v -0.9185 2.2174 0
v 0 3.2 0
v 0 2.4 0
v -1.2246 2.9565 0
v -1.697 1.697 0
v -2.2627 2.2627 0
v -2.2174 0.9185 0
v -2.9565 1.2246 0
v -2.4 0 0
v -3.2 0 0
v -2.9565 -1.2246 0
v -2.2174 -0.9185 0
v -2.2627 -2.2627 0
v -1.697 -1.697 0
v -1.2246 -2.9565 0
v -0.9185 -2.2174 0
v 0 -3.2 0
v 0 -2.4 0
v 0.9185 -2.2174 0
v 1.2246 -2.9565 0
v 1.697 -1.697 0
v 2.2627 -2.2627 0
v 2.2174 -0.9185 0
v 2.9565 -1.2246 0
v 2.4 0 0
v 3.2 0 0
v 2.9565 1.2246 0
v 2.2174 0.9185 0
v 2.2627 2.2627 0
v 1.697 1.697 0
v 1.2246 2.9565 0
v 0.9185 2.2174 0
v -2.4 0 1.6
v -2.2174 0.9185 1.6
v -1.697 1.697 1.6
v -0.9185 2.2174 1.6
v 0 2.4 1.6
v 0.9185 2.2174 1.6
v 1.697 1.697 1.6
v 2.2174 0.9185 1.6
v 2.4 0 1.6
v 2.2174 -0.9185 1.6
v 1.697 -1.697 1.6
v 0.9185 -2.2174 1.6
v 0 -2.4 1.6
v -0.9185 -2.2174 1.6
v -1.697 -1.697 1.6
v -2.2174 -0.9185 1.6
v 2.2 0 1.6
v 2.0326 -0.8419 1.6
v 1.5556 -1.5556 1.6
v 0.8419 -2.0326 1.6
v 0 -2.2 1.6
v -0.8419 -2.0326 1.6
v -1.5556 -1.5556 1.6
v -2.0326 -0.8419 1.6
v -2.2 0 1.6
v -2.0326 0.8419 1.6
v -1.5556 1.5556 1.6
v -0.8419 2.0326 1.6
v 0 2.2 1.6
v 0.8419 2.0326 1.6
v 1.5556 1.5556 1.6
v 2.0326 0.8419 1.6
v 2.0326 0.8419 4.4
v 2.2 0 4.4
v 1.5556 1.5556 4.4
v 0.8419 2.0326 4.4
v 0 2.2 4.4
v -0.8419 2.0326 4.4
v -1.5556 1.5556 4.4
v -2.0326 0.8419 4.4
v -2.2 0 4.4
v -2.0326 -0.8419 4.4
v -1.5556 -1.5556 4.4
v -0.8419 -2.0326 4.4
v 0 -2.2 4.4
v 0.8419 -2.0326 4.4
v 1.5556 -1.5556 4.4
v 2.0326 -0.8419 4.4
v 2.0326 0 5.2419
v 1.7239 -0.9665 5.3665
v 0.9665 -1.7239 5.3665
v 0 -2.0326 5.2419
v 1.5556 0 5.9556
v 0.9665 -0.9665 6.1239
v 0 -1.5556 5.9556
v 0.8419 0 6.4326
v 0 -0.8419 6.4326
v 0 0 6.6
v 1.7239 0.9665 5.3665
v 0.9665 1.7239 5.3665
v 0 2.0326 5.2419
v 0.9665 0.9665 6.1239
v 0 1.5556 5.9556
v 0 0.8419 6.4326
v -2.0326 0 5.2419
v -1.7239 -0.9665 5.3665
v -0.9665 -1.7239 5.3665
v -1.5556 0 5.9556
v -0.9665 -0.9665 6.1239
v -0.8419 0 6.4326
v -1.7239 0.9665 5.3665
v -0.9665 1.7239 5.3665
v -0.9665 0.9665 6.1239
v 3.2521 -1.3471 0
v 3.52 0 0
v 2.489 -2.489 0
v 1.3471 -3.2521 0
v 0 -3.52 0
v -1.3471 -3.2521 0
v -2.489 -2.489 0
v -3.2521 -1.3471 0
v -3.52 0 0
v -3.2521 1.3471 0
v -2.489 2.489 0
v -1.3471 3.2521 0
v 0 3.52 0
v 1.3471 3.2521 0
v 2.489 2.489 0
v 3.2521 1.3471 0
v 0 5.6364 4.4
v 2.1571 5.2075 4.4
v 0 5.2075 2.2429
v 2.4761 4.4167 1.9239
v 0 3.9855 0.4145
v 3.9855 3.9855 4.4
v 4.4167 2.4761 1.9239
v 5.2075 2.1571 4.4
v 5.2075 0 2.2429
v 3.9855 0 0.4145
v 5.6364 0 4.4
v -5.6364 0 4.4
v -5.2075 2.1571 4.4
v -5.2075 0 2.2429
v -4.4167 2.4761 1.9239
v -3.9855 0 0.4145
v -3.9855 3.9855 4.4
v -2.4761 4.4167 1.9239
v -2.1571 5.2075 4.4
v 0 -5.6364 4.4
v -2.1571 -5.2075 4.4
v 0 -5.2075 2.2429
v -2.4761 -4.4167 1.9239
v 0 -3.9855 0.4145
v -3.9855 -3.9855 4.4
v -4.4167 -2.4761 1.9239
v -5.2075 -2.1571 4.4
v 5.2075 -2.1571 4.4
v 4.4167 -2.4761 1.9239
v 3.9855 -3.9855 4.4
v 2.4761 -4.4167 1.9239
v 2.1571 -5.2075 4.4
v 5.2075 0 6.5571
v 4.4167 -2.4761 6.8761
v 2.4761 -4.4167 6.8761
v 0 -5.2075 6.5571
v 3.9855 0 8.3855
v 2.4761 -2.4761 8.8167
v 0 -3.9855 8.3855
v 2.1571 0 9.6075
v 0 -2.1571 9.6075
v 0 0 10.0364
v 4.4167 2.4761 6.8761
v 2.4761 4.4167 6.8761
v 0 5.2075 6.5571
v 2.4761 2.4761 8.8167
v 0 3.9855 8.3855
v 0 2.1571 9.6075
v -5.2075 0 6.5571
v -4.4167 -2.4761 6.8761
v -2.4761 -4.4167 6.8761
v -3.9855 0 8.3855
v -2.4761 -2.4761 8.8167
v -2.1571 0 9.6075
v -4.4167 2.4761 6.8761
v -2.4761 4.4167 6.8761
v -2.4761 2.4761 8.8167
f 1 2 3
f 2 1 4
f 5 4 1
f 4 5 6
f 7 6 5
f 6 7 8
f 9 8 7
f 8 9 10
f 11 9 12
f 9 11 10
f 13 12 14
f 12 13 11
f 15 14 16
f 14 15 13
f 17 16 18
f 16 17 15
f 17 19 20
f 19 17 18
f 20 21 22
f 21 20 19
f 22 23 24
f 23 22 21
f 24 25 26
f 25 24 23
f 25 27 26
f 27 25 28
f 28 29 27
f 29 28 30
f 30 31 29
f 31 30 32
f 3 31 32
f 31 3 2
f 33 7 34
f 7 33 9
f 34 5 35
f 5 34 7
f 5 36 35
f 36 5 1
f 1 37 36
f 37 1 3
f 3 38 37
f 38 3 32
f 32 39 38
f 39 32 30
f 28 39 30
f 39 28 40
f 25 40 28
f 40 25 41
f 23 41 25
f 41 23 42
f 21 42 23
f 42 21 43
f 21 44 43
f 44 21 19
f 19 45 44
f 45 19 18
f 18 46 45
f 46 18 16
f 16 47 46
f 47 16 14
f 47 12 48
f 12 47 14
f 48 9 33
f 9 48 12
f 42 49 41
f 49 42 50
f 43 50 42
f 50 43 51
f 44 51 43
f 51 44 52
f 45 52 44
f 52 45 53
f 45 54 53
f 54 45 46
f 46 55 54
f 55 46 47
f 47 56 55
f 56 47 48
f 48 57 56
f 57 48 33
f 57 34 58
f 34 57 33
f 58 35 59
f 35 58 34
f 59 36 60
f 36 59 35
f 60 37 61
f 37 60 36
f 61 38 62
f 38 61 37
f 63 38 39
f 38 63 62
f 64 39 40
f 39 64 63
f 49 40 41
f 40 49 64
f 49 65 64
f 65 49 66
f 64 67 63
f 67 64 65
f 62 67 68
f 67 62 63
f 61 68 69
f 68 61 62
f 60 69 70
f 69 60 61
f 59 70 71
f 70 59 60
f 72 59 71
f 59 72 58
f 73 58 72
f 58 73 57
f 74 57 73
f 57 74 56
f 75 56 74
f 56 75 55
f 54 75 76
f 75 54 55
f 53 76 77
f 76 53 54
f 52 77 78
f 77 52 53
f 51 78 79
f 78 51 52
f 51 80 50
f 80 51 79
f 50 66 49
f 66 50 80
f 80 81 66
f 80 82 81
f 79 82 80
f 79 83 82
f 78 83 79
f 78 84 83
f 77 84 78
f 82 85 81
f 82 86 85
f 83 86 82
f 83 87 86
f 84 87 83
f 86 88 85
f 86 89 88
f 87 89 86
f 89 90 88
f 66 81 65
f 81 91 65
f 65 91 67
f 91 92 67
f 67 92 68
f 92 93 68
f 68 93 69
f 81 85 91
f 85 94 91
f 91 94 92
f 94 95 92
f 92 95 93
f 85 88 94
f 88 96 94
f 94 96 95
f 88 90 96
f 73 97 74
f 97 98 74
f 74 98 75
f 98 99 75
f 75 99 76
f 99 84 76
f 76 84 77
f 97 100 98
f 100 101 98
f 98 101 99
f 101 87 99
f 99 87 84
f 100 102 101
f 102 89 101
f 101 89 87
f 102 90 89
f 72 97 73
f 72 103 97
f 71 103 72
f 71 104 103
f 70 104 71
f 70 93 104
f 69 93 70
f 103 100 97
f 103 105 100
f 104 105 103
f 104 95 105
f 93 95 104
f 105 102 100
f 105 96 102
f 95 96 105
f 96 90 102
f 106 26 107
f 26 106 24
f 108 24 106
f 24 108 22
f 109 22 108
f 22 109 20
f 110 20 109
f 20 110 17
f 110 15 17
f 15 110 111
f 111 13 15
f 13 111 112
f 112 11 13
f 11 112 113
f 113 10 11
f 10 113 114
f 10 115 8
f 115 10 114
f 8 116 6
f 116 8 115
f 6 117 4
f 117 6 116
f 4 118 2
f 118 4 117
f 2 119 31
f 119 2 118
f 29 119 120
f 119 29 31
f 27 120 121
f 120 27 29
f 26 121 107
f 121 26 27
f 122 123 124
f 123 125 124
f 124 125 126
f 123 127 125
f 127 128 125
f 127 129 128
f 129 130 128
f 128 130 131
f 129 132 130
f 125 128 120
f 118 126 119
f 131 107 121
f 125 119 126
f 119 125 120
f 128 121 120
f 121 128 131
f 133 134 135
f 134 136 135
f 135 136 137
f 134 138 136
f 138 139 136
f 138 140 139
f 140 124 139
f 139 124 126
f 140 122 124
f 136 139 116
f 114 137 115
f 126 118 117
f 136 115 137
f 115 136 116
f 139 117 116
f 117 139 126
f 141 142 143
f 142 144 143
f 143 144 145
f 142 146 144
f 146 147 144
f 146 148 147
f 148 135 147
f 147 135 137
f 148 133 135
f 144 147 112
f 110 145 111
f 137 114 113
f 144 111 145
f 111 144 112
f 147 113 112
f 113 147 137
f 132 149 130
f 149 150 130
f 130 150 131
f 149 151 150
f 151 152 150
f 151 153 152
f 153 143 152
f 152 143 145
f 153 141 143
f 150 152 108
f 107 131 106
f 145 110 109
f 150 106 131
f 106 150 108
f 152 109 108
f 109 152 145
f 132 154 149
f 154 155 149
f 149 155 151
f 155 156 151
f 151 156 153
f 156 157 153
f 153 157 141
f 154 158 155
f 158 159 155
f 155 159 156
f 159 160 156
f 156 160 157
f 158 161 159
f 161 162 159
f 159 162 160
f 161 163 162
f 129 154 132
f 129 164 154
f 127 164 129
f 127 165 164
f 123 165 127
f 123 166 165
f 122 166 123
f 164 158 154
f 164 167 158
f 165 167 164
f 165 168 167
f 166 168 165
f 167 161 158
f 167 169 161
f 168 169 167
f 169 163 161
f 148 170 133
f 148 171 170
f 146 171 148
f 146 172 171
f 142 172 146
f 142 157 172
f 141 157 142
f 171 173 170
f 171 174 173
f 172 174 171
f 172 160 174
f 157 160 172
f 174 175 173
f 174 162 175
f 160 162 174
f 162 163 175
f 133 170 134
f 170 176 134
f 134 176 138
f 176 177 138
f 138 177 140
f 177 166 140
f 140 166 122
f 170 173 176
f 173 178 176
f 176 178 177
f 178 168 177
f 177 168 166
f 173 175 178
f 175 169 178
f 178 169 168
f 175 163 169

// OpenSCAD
// file: ../p/4-4ring3.scad
use <../lib.scad>
function ldraw_lib__4_4ring3() = [
// 0 Ring  3 x 1.0
// 0 Name: 4-4ring3.dat
// 0 Author: James Jessiman
// 0 !LDRAW_ORG Primitive UPDATE 2009-01
// 0 !LICENSE Licensed under CC BY 2.0 and CC BY 4.0 : see CAreadme.txt
// 
// 0 BFC CERTIFY CCW
  [0,"BFC","CERTIFY"],
  [0,"BFC","CCW"],
// 
// 0 !HISTORY 1998-12-15 [PTadmin] Official Update 1998-10
// 0 !HISTORY 2002-04-05 [hafhead] Added BFC statement
// 0 !HISTORY 2002-04-25 [PTadmin] Official Update 2002-02
// 0 !HISTORY 2007-06-24 [PTadmin] Header formatted for Contributor Agreement
// 0 !HISTORY 2008-07-01 [PTadmin] Official Update 2008-01
// 0 !HISTORY 2008-08-26 [cwdee] Switch polygon winding and rename
// 0 !HISTORY 2009-05-02 [PTadmin] Official Update 2009-01
// 
// 
// 4 16 -1.5308 0 3.6956 -1.1481 0 2.7717 0 0 3 0 0 4
  [4,16,-1.5308,0,3.6956,-1.1481,0,2.7717,0,0,3,0,0,4],
// 4 16 -2.8284 0 2.8284 -2.1213 0 2.1213 -1.1481 0 2.7717 -1.5308 0 3.6956
  [4,16,-2.8284,0,2.8284,-2.1213,0,2.1213,-1.1481,0,2.7717,-1.5308,0,3.6956],
// 4 16 -3.6956 0 1.5308 -2.7717 0 1.1481 -2.1213 0 2.1213 -2.8284 0 2.8284
  [4,16,-3.6956,0,1.5308,-2.7717,0,1.1481,-2.1213,0,2.1213,-2.8284,0,2.8284],
// 4 16 -4 0 0 -3 0 0 -2.7717 0 1.1481 -3.6956 0 1.5308
  [4,16,-4,0,0,-3,0,0,-2.7717,0,1.1481,-3.6956,0,1.5308],
// 4 16 -3.6956 0 -1.5308 -2.7717 0 -1.1481 -3 0 0 -4 0 0
  [4,16,-3.6956,0,-1.5308,-2.7717,0,-1.1481,-3,0,0,-4,0,0],
// 4 16 -2.8284 0 -2.8284 -2.1213 0 -2.1213 -2.7717 0 -1.1481 -3.6956 0 -1.5308
  [4,16,-2.8284,0,-2.8284,-2.1213,0,-2.1213,-2.7717,0,-1.1481,-3.6956,0,-1.5308],
// 4 16 -1.5308 0 -3.6956 -1.1481 0 -2.7717 -2.1213 0 -2.1213 -2.8284 0 -2.8284
  [4,16,-1.5308,0,-3.6956,-1.1481,0,-2.7717,-2.1213,0,-2.1213,-2.8284,0,-2.8284],
// 4 16 0 0 -4 0 0 -3 -1.1481 0 -2.7717 -1.5308 0 -3.6956
  [4,16,0,0,-4,0,0,-3,-1.1481,0,-2.7717,-1.5308,0,-3.6956],
// 4 16 1.5308 0 -3.6956 1.1481 0 -2.7717 0 0 -3 0 0 -4
  [4,16,1.5308,0,-3.6956,1.1481,0,-2.7717,0,0,-3,0,0,-4],
// 4 16 2.8284 0 -2.8284 2.1213 0 -2.1213 1.1481 0 -2.7717 1.5308 0 -3.6956
  [4,16,2.8284,0,-2.8284,2.1213,0,-2.1213,1.1481,0,-2.7717,1.5308,0,-3.6956],
// 4 16 3.6956 0 -1.5308 2.7717 0 -1.1481 2.1213 0 -2.1213 2.8284 0 -2.8284
  [4,16,3.6956,0,-1.5308,2.7717,0,-1.1481,2.1213,0,-2.1213,2.8284,0,-2.8284],
// 4 16 4 0 0 3 0 0 2.7717 0 -1.1481 3.6956 0 -1.5308
  [4,16,4,0,0,3,0,0,2.7717,0,-1.1481,3.6956,0,-1.5308],
// 4 16 3.6956 0 1.5308 2.7717 0 1.1481 3 0 0 4 0 0
  [4,16,3.6956,0,1.5308,2.7717,0,1.1481,3,0,0,4,0,0],
// 4 16 2.8284 0 2.8284 2.1213 0 2.1213 2.7717 0 1.1481 3.6956 0 1.5308
  [4,16,2.8284,0,2.8284,2.1213,0,2.1213,2.7717,0,1.1481,3.6956,0,1.5308],
// 4 16 1.5308 0 3.6956 1.1481 0 2.7717 2.1213 0 2.1213 2.8284 0 2.8284
  [4,16,1.5308,0,3.6956,1.1481,0,2.7717,2.1213,0,2.1213,2.8284,0,2.8284],
// 4 16 0 0 4 0 0 3 1.1481 0 2.7717 1.5308 0 3.6956
  [4,16,0,0,4,0,0,3,1.1481,0,2.7717,1.5308,0,3.6956],
// 0
];
makepoly(ldraw_lib__4_4ring3(), line=0.2);
// file: ../p/4-4cylo.scad
use <../lib.scad>
use <4-4cyli.scad>
use <4-4edge.scad>
function ldraw_lib__4_4cylo() = [
// 0 Cylinder Open 1.0
// 0 Name: 4-4cylo.dat
// 0 Author: Mark Kennedy [mkennedy]
// 0 !LDRAW_ORG Primitive UPDATE 2010-01
// 0 !LICENSE Licensed under CC BY 2.0 and CC BY 4.0 : see CAreadme.txt
// 
// 0 BFC CERTIFY CCW
  [0,"BFC","CERTIFY"],
  [0,"BFC","CCW"],
// 
// 0 !HISTORY 2010-04-05 [PTadmin] Official Update 2010-01
// 
// 
// 1 16 0 0 0 1 0 0 0 1 0 0 0 1 4-4edge.dat
  [1,16,0,0,0,1,0,0,0,1,0,0,0,1, ldraw_lib__4_4edge()],
// 1 16 0 1 0 1 0 0 0 1 0 0 0 1 4-4edge.dat
  [1,16,0,1,0,1,0,0,0,1,0,0,0,1, ldraw_lib__4_4edge()],
// 1 16 0 0 0 1 0 0 0 1 0 0 0 1 4-4cyli.dat
  [1,16,0,0,0,1,0,0,0,1,0,0,0,1, ldraw_lib__4_4cyli()],
// 0
];
makepoly(ldraw_lib__4_4cylo(), line=0.2);
// file: ../p/1-8sphe.scad
use <../lib.scad>
function ldraw_lib__1_8sphe() = [
// 0 Sphere 0.125
// 0 Name: 1-8sphe.dat
// 0 Author: James Jessiman
// 0 !LDRAW_ORG Primitive UPDATE 2012-03
// 0 !LICENSE Licensed under CC BY 2.0 and CC BY 4.0 : see CAreadme.txt
// 
// 0 BFC CERTIFY CCW
  [0,"BFC","CERTIFY"],
  [0,"BFC","CCW"],
// 
// 0 !HISTORY 2000-08-01 {Axel Poque} fixes to resolve L3P error messages.
// 0 !HISTORY 2000-08-01 {Manfred Moolhuysen} fixes to resolve L3P error messages.
// 0 !HISTORY 2000-09-30 [PTadmin] Official Update 2000-02
// 0 !HISTORY 2002-03-28 [hafhead] Made BFC compliant
// 0 !HISTORY 2002-04-25 [PTadmin] Official Update 2002-02
// 0 !HISTORY 2007-06-22 [PTadmin] Header formatted for Contributor Agreement
// 0 !HISTORY 2008-07-01 [PTadmin] Official Update 2008-01
// 0 !HISTORY 2010-09-12 [MagFors] Changed winding, removed duplicated cond-line, optimized filesize
// 0 !HISTORY 2010-12-31 [PTadmin] Official Update 2010-03
// 0 !HISTORY 2012-07-01 [tcobbs] Replaced with geometry from LDView
// 0 !HISTORY 2012-12-28 [PTadmin] Official Update 2012-03
// 
// 
// 3 16 1 0 0 0.9239 0.3827 0 0.9239 0 0.3827
  [3,16,1,0,0,0.9239,0.3827,0,0.9239,0,0.3827],
// 3 16 0.9239 0.3827 0 0.7836 0.4393 0.4393 0.9239 0 0.3827
  [3,16,0.9239,0.3827,0,0.7836,0.4393,0.4393,0.9239,0,0.3827],
// 3 16 0.9239 0 0.3827 0.7836 0.4393 0.4393 0.7071 0 0.7071
  [3,16,0.9239,0,0.3827,0.7836,0.4393,0.4393,0.7071,0,0.7071],
// 3 16 0.7836 0.4393 0.4393 0.4393 0.4393 0.7836 0.7071 0 0.7071
  [3,16,0.7836,0.4393,0.4393,0.4393,0.4393,0.7836,0.7071,0,0.7071],
// 3 16 0.7071 0 0.7071 0.4393 0.4393 0.7836 0.3827 0 0.9239
  [3,16,0.7071,0,0.7071,0.4393,0.4393,0.7836,0.3827,0,0.9239],
// 3 16 0.4393 0.4393 0.7836 0 0.3827 0.9239 0.3827 0 0.9239
  [3,16,0.4393,0.4393,0.7836,0,0.3827,0.9239,0.3827,0,0.9239],
// 3 16 0.3827 0 0.9239 0 0.3827 0.9239 0 0 1
  [3,16,0.3827,0,0.9239,0,0.3827,0.9239,0,0,1],
// 3 16 0.9239 0.3827 0 0.7071 0.7071 0 0.7836 0.4393 0.4393
  [3,16,0.9239,0.3827,0,0.7071,0.7071,0,0.7836,0.4393,0.4393],
// 3 16 0.7071 0.7071 0 0.4393 0.7836 0.4393 0.7836 0.4393 0.4393
  [3,16,0.7071,0.7071,0,0.4393,0.7836,0.4393,0.7836,0.4393,0.4393],
// 3 16 0.7836 0.4393 0.4393 0.4393 0.7836 0.4393 0.4393 0.4393 0.7836
  [3,16,0.7836,0.4393,0.4393,0.4393,0.7836,0.4393,0.4393,0.4393,0.7836],
// 3 16 0.4393 0.7836 0.4393 0 0.7071 0.7071 0.4393 0.4393 0.7836
  [3,16,0.4393,0.7836,0.4393,0,0.7071,0.7071,0.4393,0.4393,0.7836],
// 3 16 0.4393 0.4393 0.7836 0 0.7071 0.7071 0 0.3827 0.9239
  [3,16,0.4393,0.4393,0.7836,0,0.7071,0.7071,0,0.3827,0.9239],
// 3 16 0.7071 0.7071 0 0.3827 0.9239 0 0.4393 0.7836 0.4393
  [3,16,0.7071,0.7071,0,0.3827,0.9239,0,0.4393,0.7836,0.4393],
// 3 16 0.3827 0.9239 0 0 0.9239 0.3827 0.4393 0.7836 0.4393
  [3,16,0.3827,0.9239,0,0,0.9239,0.3827,0.4393,0.7836,0.4393],
// 3 16 0.4393 0.7836 0.4393 0 0.9239 0.3827 0 0.7071 0.7071
  [3,16,0.4393,0.7836,0.4393,0,0.9239,0.3827,0,0.7071,0.7071],
// 3 16 0.3827 0.9239 0 0 1 0 0 0.9239 0.3827
  [3,16,0.3827,0.9239,0,0,1,0,0,0.9239,0.3827],
// 
// 5 24 1 0 0 0.9239 0.3827 0 1 0 -0.1 0.9239 0 0.3827
  [5,24,1,0,0,0.9239,0.3827,0,1,0,-0.1,0.9239,0,0.3827],
// 5 24 0.9239 0.3827 0 0.9239 0 0.3827 1 0 0 0.7836 0.4393 0.4393
  [5,24,0.9239,0.3827,0,0.9239,0,0.3827,1,0,0,0.7836,0.4393,0.4393],
// 5 24 1 0 0 0.9239 0 0.3827 0.9239 0.3827 0 1 -0.1 0
  [5,24,1,0,0,0.9239,0,0.3827,0.9239,0.3827,0,1,-0.1,0],
// 5 24 0.9239 0 0.3827 0.7836 0.4393 0.4393 0.9239 0.3827 0 0.7071 0 0.7071
  [5,24,0.9239,0,0.3827,0.7836,0.4393,0.4393,0.9239,0.3827,0,0.7071,0,0.7071],
// 5 24 0.7836 0.4393 0.4393 0.7071 0 0.7071 0.9239 0 0.3827 0.4393 0.4393 0.7836
  [5,24,0.7836,0.4393,0.4393,0.7071,0,0.7071,0.9239,0,0.3827,0.4393,0.4393,0.7836],
// 5 24 0.9239 0 0.3827 0.7071 0 0.7071 0.7836 0.4393 0.4393 0.9239 -0.1 0.3827
  [5,24,0.9239,0,0.3827,0.7071,0,0.7071,0.7836,0.4393,0.4393,0.9239,-0.1,0.3827],
// 5 24 0.7071 0 0.7071 0.4393 0.4393 0.7836 0.7836 0.4393 0.4393 0.3827 0 0.9239
  [5,24,0.7071,0,0.7071,0.4393,0.4393,0.7836,0.7836,0.4393,0.4393,0.3827,0,0.9239],
// 5 24 0.4393 0.4393 0.7836 0.3827 0 0.9239 0.7071 0 0.7071 0 0.3827 0.9239
  [5,24,0.4393,0.4393,0.7836,0.3827,0,0.9239,0.7071,0,0.7071,0,0.3827,0.9239],
// 5 24 0.7071 0 0.7071 0.3827 0 0.9239 0.4393 0.4393 0.7836 0.7071 -0.1 0.7071
  [5,24,0.7071,0,0.7071,0.3827,0,0.9239,0.4393,0.4393,0.7836,0.7071,-0.1,0.7071],
// 5 24 0.3827 0 0.9239 0 0.3827 0.9239 0.4393 0.4393 0.7836 0 0 1
  [5,24,0.3827,0,0.9239,0,0.3827,0.9239,0.4393,0.4393,0.7836,0,0,1],
// 5 24 0 0.3827 0.9239 0 0 1 0.3827 0 0.9239 -0.1 0.3827 0.9239
  [5,24,0,0.3827,0.9239,0,0,1,0.3827,0,0.9239,-0.1,0.3827,0.9239],
// 5 24 0.3827 0 0.9239 0 0 1 0 0.3827 0.9239 0.3827 -0.1 0.9239
  [5,24,0.3827,0,0.9239,0,0,1,0,0.3827,0.9239,0.3827,-0.1,0.9239],
// 5 24 0.9239 0.3827 0 0.7071 0.7071 0 0.9239 0.3827 -0.1 0.7836 0.4393 0.4393
  [5,24,0.9239,0.3827,0,0.7071,0.7071,0,0.9239,0.3827,-0.1,0.7836,0.4393,0.4393],
// 5 24 0.7071 0.7071 0 0.7836 0.4393 0.4393 0.9239 0.3827 0 0.4393 0.7836 0.4393
  [5,24,0.7071,0.7071,0,0.7836,0.4393,0.4393,0.9239,0.3827,0,0.4393,0.7836,0.4393],
// 5 24 0.9239 0.3827 0 0.7836 0.4393 0.4393 0.7071 0.7071 0 0.9239 0 0.3827
  [5,24,0.9239,0.3827,0,0.7836,0.4393,0.4393,0.7071,0.7071,0,0.9239,0,0.3827],
// 5 24 0.7836 0.4393 0.4393 0.4393 0.7836 0.4393 0.7071 0.7071 0 0.4393 0.4393 0.7836
  [5,24,0.7836,0.4393,0.4393,0.4393,0.7836,0.4393,0.7071,0.7071,0,0.4393,0.4393,0.7836],
// 5 24 0.4393 0.7836 0.4393 0.4393 0.4393 0.7836 0.7836 0.4393 0.4393 0 0.7071 0.7071
  [5,24,0.4393,0.7836,0.4393,0.4393,0.4393,0.7836,0.7836,0.4393,0.4393,0,0.7071,0.7071],
// 5 24 0.7836 0.4393 0.4393 0.4393 0.4393 0.7836 0.4393 0.7836 0.4393 0.7071 0 0.7071
  [5,24,0.7836,0.4393,0.4393,0.4393,0.4393,0.7836,0.4393,0.7836,0.4393,0.7071,0,0.7071],
// 5 24 0.4393 0.4393 0.7836 0 0.7071 0.7071 0.4393 0.7836 0.4393 0 0.3827 0.9239
  [5,24,0.4393,0.4393,0.7836,0,0.7071,0.7071,0.4393,0.7836,0.4393,0,0.3827,0.9239],
// 5 24 0 0.7071 0.7071 0 0.3827 0.9239 0.4393 0.4393 0.7836 -0.1 0.7071 0.7071
  [5,24,0,0.7071,0.7071,0,0.3827,0.9239,0.4393,0.4393,0.7836,-0.1,0.7071,0.7071],
// 5 24 0.4393 0.4393 0.7836 0 0.3827 0.9239 0 0.7071 0.7071 0.3827 0 0.9239
  [5,24,0.4393,0.4393,0.7836,0,0.3827,0.9239,0,0.7071,0.7071,0.3827,0,0.9239],
// 5 24 0.7071 0.7071 0 0.3827 0.9239 0 0.7071 0.7071 -0.1 0.4393 0.7836 0.4393
  [5,24,0.7071,0.7071,0,0.3827,0.9239,0,0.7071,0.7071,-0.1,0.4393,0.7836,0.4393],
// 5 24 0.3827 0.9239 0 0.4393 0.7836 0.4393 0.7071 0.7071 0 0 0.9239 0.3827
  [5,24,0.3827,0.9239,0,0.4393,0.7836,0.4393,0.7071,0.7071,0,0,0.9239,0.3827],
// 5 24 0.7071 0.7071 0 0.4393 0.7836 0.4393 0.3827 0.9239 0 0.7836 0.4393 0.4393
  [5,24,0.7071,0.7071,0,0.4393,0.7836,0.4393,0.3827,0.9239,0,0.7836,0.4393,0.4393],
// 5 24 0.4393 0.7836 0.4393 0 0.9239 0.3827 0.3827 0.9239 0 0 0.7071 0.7071
  [5,24,0.4393,0.7836,0.4393,0,0.9239,0.3827,0.3827,0.9239,0,0,0.7071,0.7071],
// 5 24 0 0.9239 0.3827 0 0.7071 0.7071 0.4393 0.7836 0.4393 -0.1 0.9239 0.3827
  [5,24,0,0.9239,0.3827,0,0.7071,0.7071,0.4393,0.7836,0.4393,-0.1,0.9239,0.3827],
// 5 24 0.4393 0.7836 0.4393 0 0.7071 0.7071 0 0.9239 0.3827 0.4393 0.4393 0.7836
  [5,24,0.4393,0.7836,0.4393,0,0.7071,0.7071,0,0.9239,0.3827,0.4393,0.4393,0.7836],
// 5 24 0.3827 0.9239 0 0 1 0 0.3827 0.9239 -0.1 0 0.9239 0.3827
  [5,24,0.3827,0.9239,0,0,1,0,0.3827,0.9239,-0.1,0,0.9239,0.3827],
// 5 24 0 1 0 0 0.9239 0.3827 0.3827 0.9239 0 -0.1 1 0
  [5,24,0,1,0,0,0.9239,0.3827,0.3827,0.9239,0,-0.1,1,0],
// 5 24 0.3827 0.9239 0 0 0.9239 0.3827 0 1 0 0.4393 0.7836 0.4393
  [5,24,0.3827,0.9239,0,0,0.9239,0.3827,0,1,0,0.4393,0.7836,0.4393],
];
makepoly(ldraw_lib__1_8sphe(), line=0.2);
// file: ../p/stud4od.scad
use <../lib.scad>
use <4-4cylo.scad>
use <4-4ring3.scad>
function ldraw_lib__stud4od() = [
// 0 Stud Tube Open without Outer Cylinder and Top Surface
// 0 Name: stud4od.dat
// 0 Author: Philippe Hurbain [Philo]
// 0 !LDRAW_ORG Primitive UPDATE 2013-02
// 0 !LICENSE Licensed under CC BY 2.0 and CC BY 4.0 : see CAreadme.txt
// 
// 0 !HELP This stud is a "antistud" to be used like a underside stud,
// 0 !HELP but without the outer cylinder.
// 0 !HELP 1 47 0 0 0 1 0 0 0 1 0 0 0 1 stud4.dat
// 
// 0 BFC CERTIFY CCW
  [0,"BFC","CERTIFY"],
  [0,"BFC","CCW"],
// 
// 0 !HISTORY 2013-12-23 [PTadmin] Official Update 2013-02
// 
// 
// 1 16 0 -4 0 2 0 0 0 1 0 0 0 2 4-4ring3.dat
  [1,16,0,-4,0,2,0,0,0,1,0,0,0,2, ldraw_lib__4_4ring3()],
// 0 BFC INVERTNEXT
  [0,"BFC","INVERTNEXT"],
// 1 16 0 0 0 -6 0 0 0 -4 0 0 0 6 4-4cylo.dat
  [1,16,0,0,0,-6,0,0,0,-4,0,0,0,6, ldraw_lib__4_4cylo()],
];
makepoly(ldraw_lib__stud4od(), line=0.2);
// file: s/90617s02.scad
use <../../lib.scad>
function ldraw_lib__s__90617s02() = [
// 0 ~Constraction Ball Quarter with 1 Circular Cutout
// 0 Name: s\90617s02.dat
// 0 Author: Magnus Forsberg [MagFors]
// 0 !LDRAW_ORG Subpart UPDATE 2018-02
// 0 !LICENSE Licensed under CC BY 2.0 and CC BY 4.0 : see CAreadme.txt
// 
// 0 BFC CERTIFY CCW
  [0,"BFC","CERTIFY"],
  [0,"BFC","CCW"],
// 
// 0 !HISTORY 2018-12-08 [PTadmin] Official Update 2018-02
// 
// 
// 3 16 12.81 0 0 11.8352 4.9024 0 11.8352 0 4.9024
  [3,16,12.81,0,0,11.8352,4.9024,0,11.8352,0,4.9024],
// 3 16 11.8352 4.9024 0 10.0379 5.6274 5.6274 11.8352 0 4.9024
  [3,16,11.8352,4.9024,0,10.0379,5.6274,5.6274,11.8352,0,4.9024],
// 3 16 11.8352 0 4.9024 10.0379 5.6274 5.6274 9.058 0 9.058
  [3,16,11.8352,0,4.9024,10.0379,5.6274,5.6274,9.058,0,9.058],
// 3 16 11.8352 4.9024 0 9.058 9.058 0 10.0379 5.6274 5.6274
  [3,16,11.8352,4.9024,0,9.058,9.058,0,10.0379,5.6274,5.6274],
// 3 16 9.058 9.058 0 5.6274 10.0379 5.6274 10.0379 5.6274 5.6274
  [3,16,9.058,9.058,0,5.6274,10.0379,5.6274,10.0379,5.6274,5.6274],
// 3 16 9.058 9.058 0 4.9024 11.8352 0 5.6274 10.0379 5.6274
  [3,16,9.058,9.058,0,4.9024,11.8352,0,5.6274,10.0379,5.6274],
// 3 16 4.9024 11.8352 0 0 11.8352 4.9024 5.6274 10.0379 5.6274
  [3,16,4.9024,11.8352,0,0,11.8352,4.9024,5.6274,10.0379,5.6274],
// 3 16 5.6274 10.0379 5.6274 0 11.8352 4.9024 0 9.058 9.058
  [3,16,5.6274,10.0379,5.6274,0,11.8352,4.9024,0,9.058,9.058],
// 3 16 4.9024 11.8352 0 0 12.81 0 0 11.8352 4.9024
  [3,16,4.9024,11.8352,0,0,12.81,0,0,11.8352,4.9024],
// 3 16 10.0379 5.6274 5.6274 5.6274 10.0379 5.6274 5.6568 5.6568 10
  [3,16,10.0379,5.6274,5.6274,5.6274,10.0379,5.6274,5.6568,5.6568,10],
// 3 16 8 0 10 9.058 0 9.058 7.3912 3.0616 10
  [3,16,8,0,10,9.058,0,9.058,7.3912,3.0616,10],
// 3 16 0 9.058 9.058 0 8 10 3.0616 7.3912 10
  [3,16,0,9.058,9.058,0,8,10,3.0616,7.3912,10],
// 3 16 10.0379 5.6274 5.6274 7.3912 3.0616 10 9.058 0 9.058
  [3,16,10.0379,5.6274,5.6274,7.3912,3.0616,10,9.058,0,9.058],
// 3 16 7.3912 3.0616 10 10.0379 5.6274 5.6274 5.6568 5.6568 10
  [3,16,7.3912,3.0616,10,10.0379,5.6274,5.6274,5.6568,5.6568,10],
// 3 16 5.6274 10.0379 5.6274 3.0616 7.3912 10 5.6568 5.6568 10
  [3,16,5.6274,10.0379,5.6274,3.0616,7.3912,10,5.6568,5.6568,10],
// 3 16 3.0616 7.3912 10 5.6274 10.0379 5.6274 0 9.058 9.058
  [3,16,3.0616,7.3912,10,5.6274,10.0379,5.6274,0,9.058,9.058],
// 
// 5 24 12.81 0 0 11.8352 4.9024 0 12.81 0 -1.281 11.8352 0 4.9024
  [5,24,12.81,0,0,11.8352,4.9024,0,12.81,0,-1.281,11.8352,0,4.9024],
// 5 24 11.8352 4.9024 0 11.8352 0 4.9024 12.81 0 0 10.0379 5.6274 5.6274
  [5,24,11.8352,4.9024,0,11.8352,0,4.9024,12.81,0,0,10.0379,5.6274,5.6274],
// 5 24 12.81 0 0 11.8352 0 4.9024 11.8352 4.9024 0 12.81 -1.281 0
  [5,24,12.81,0,0,11.8352,0,4.9024,11.8352,4.9024,0,12.81,-1.281,0],
// 5 24 11.8352 0 4.9024 10.0379 5.6274 5.6274 11.8352 4.9024 0 9.058 0 9.058
  [5,24,11.8352,0,4.9024,10.0379,5.6274,5.6274,11.8352,4.9024,0,9.058,0,9.058],
// 5 24 10.0379 5.6274 5.6274 9.058 0 9.058 7.3912 3.0616 10 11.8352 0 4.9024
  [5,24,10.0379,5.6274,5.6274,9.058,0,9.058,7.3912,3.0616,10,11.8352,0,4.9024],
// 5 24 11.8352 0 4.9024 9.058 0 9.058 10.0379 5.6274 5.6274 11.8352 -1.281 4.9024
  [5,24,11.8352,0,4.9024,9.058,0,9.058,10.0379,5.6274,5.6274,11.8352,-1.281,4.9024],
// 5 24 11.8352 4.9024 0 9.058 9.058 0 11.8352 4.9024 -1.281 10.0379 5.6274 5.6274
  [5,24,11.8352,4.9024,0,9.058,9.058,0,11.8352,4.9024,-1.281,10.0379,5.6274,5.6274],
// 5 24 11.8352 4.9024 0 10.0379 5.6274 5.6274 9.058 9.058 0 11.8352 0 4.9024
  [5,24,11.8352,4.9024,0,10.0379,5.6274,5.6274,9.058,9.058,0,11.8352,0,4.9024],
// 5 24 10.0379 5.6274 5.6274 5.6568 5.6568 10 7.3912 3.0616 10 5.6274 10.0379 5.6274
  [5,24,10.0379,5.6274,5.6274,5.6568,5.6568,10,7.3912,3.0616,10,5.6274,10.0379,5.6274],
// 5 24 9.058 0 9.058 7.3912 3.0616 10 10.0379 5.6274 5.6274 8 0 10
  [5,24,9.058,0,9.058,7.3912,3.0616,10,10.0379,5.6274,5.6274,8,0,10],
// 5 24 7.3912 3.0616 10 10.0379 5.6274 5.6274 5.6568 5.6568 10 9.058 0 9.058
  [5,24,7.3912,3.0616,10,10.0379,5.6274,5.6274,5.6568,5.6568,10,9.058,0,9.058],
// 5 24 9.058 9.058 0 5.6274 10.0379 5.6274 10.0379 5.6274 5.6274 4.9024 11.8352 0
  [5,24,9.058,9.058,0,5.6274,10.0379,5.6274,10.0379,5.6274,5.6274,4.9024,11.8352,0],
// 5 24 5.6274 10.0379 5.6274 3.0616 7.3912 10 5.6568 5.6568 10 0 9.058 9.058
  [5,24,5.6274,10.0379,5.6274,3.0616,7.3912,10,5.6568,5.6568,10,0,9.058,9.058],
// 5 24 5.6274 10.0379 5.6274 0 9.058 9.058 0 11.8352 4.9024 3.0616 7.3912 10
  [5,24,5.6274,10.0379,5.6274,0,9.058,9.058,0,11.8352,4.9024,3.0616,7.3912,10],
// 5 24 4.9024 11.8352 0 5.6274 10.0379 5.6274 9.058 9.058 0 0 11.8352 4.9024
  [5,24,4.9024,11.8352,0,5.6274,10.0379,5.6274,9.058,9.058,0,0,11.8352,4.9024],
// 5 24 4.9024 11.8352 0 0 11.8352 4.9024 0 12.81 0 5.6274 10.0379 5.6274
  [5,24,4.9024,11.8352,0,0,11.8352,4.9024,0,12.81,0,5.6274,10.0379,5.6274],
// 5 24 0 11.8352 4.9024 5.6274 10.0379 5.6274 4.9024 11.8352 0 0 9.058 9.058
  [5,24,0,11.8352,4.9024,5.6274,10.0379,5.6274,4.9024,11.8352,0,0,9.058,9.058],
// 5 24 9.058 9.058 0 10.0379 5.6274 5.6274 11.8352 4.9024 0 5.6274 10.0379 5.6274
  [5,24,9.058,9.058,0,10.0379,5.6274,5.6274,11.8352,4.9024,0,5.6274,10.0379,5.6274],
// 5 24 9.058 9.058 0 4.9024 11.8352 0 9.058 9.058 -1.281 5.6274 10.0379 5.6274
  [5,24,9.058,9.058,0,4.9024,11.8352,0,9.058,9.058,-1.281,5.6274,10.0379,5.6274],
// 5 24 0 11.8352 4.9024 0 9.058 9.058 5.6274 10.0379 5.6274 -1.281 11.8352 4.9024
  [5,24,0,11.8352,4.9024,0,9.058,9.058,5.6274,10.0379,5.6274,-1.281,11.8352,4.9024],
// 5 24 4.9024 11.8352 0 0 12.81 0 4.9024 11.8352 -1.281 0 11.8352 4.9024
  [5,24,4.9024,11.8352,0,0,12.81,0,4.9024,11.8352,-1.281,0,11.8352,4.9024],
// 5 24 0 12.81 0 0 11.8352 4.9024 4.9024 11.8352 0 -1.281 12.81 0
  [5,24,0,12.81,0,0,11.8352,4.9024,4.9024,11.8352,0,-1.281,12.81,0],
// 5 24 9.058 0 9.058 8 0 10 7.3912 3.0616 10 9.058 -1.281 9.058
  [5,24,9.058,0,9.058,8,0,10,7.3912,3.0616,10,9.058,-1.281,9.058],
// 5 24 0 9.058 9.058 0 8 10 3.0616 7.3912 10 -1.281 9.058 9.058
  [5,24,0,9.058,9.058,0,8,10,3.0616,7.3912,10,-1.281,9.058,9.058],
// 5 24 0 9.058 9.058 3.0616 7.3912 10 5.6274 10.0379 5.6274 0 8 10
  [5,24,0,9.058,9.058,3.0616,7.3912,10,5.6274,10.0379,5.6274,0,8,10],
// 5 24 0 12.81 0 4.9024 11.8352 0 0 12.81 -1.281 0 11.8352 4.9024
  [5,24,0,12.81,0,4.9024,11.8352,0,0,12.81,-1.281,0,11.8352,4.9024],
// 5 24 5.6274 10.0379 5.6274 10.0379 5.6274 5.6274 9.058 9.058 0 5.6568 5.6568 10
  [5,24,5.6274,10.0379,5.6274,10.0379,5.6274,5.6274,9.058,9.058,0,5.6568,5.6568,10],
// 5 24 5.6274 10.0379 5.6274 5.6568 5.6568 10 10.0379 5.6274 5.6274 3.0616 7.3912 10
  [5,24,5.6274,10.0379,5.6274,5.6568,5.6568,10,10.0379,5.6274,5.6274,3.0616,7.3912,10],
];
makepoly(ldraw_lib__s__90617s02(), line=0.2);
// file: ../p/4-8sphe.scad
use <../lib.scad>
use <1-8sphe.scad>
function ldraw_lib__4_8sphe() = [
// 0 Sphere 0.5
// 0 Name: 4-8sphe.dat
// 0 Author: James Jessiman
// 0 !LDRAW_ORG Primitive UPDATE 2003-02
// 0 !LICENSE Licensed under CC BY 2.0 and CC BY 4.0 : see CAreadme.txt
// 
// 0 BFC CERTIFY CCW
  [0,"BFC","CERTIFY"],
  [0,"BFC","CCW"],
// 
// 0 !HISTORY 2002-08-31 [izanette] Modified with WINDZ for BFC compliance
// 0 !HISTORY 2003-08-01 [PTadmin] Official Update 2003-02
// 0 !HISTORY 2007-06-24 [PTadmin] Header formatted for Contributor Agreement
// 0 !HISTORY 2008-07-01 [PTadmin] Official Update 2008-01
// 
// 
// 1 16 0 0 0 1 0 0 0 1 0 0 0 1 1-8sphe.dat
  [1,16,0,0,0,1,0,0,0,1,0,0,0,1, ldraw_lib__1_8sphe()],
// 1 16 0 0 0 1 0 0 0 1 0 0 0 -1 1-8sphe.dat
  [1,16,0,0,0,1,0,0,0,1,0,0,0,-1, ldraw_lib__1_8sphe()],
// 1 16 0 0 0 -1 0 0 0 1 0 0 0 1 1-8sphe.dat
  [1,16,0,0,0,-1,0,0,0,1,0,0,0,1, ldraw_lib__1_8sphe()],
// 1 16 0 0 0 -1 0 0 0 1 0 0 0 -1 1-8sphe.dat
  [1,16,0,0,0,-1,0,0,0,1,0,0,0,-1, ldraw_lib__1_8sphe()],
// 0
// 
];
makepoly(ldraw_lib__4_8sphe(), line=0.2);
// file: ../p/4-4rin11.scad
use <../lib.scad>
function ldraw_lib__4_4rin11() = [
// 0 Ring 11 x 1.0
// 0 Name: 4-4rin11.dat
// 0 Author: John Riley [jriley]
// 0 !LDRAW_ORG Primitive UPDATE 2003-03
// 0 !LICENSE Licensed under CC BY 2.0 and CC BY 4.0 : see CAreadme.txt
// 
// 0 BFC CERTIFY CCW
  [0,"BFC","CERTIFY"],
  [0,"BFC","CCW"],
// 
// 0 !HISTORY 2003-12-19 [PTadmin] Official Update 2003-03
// 0 !HISTORY 2007-06-24 [PTadmin] Header formatted for Contributor Agreement
// 0 !HISTORY 2008-07-01 [PTadmin] Official Update 2008-01
// 
// 
// 4 16 11 0 0 12 0 0 11.0868 0 4.5924 10.1629 0 4.2097
  [4,16,11,0,0,12,0,0,11.0868,0,4.5924,10.1629,0,4.2097],
// 4 16 10.1629 0 4.2097 11.0868 0 4.5924 8.4852 0 8.4852 7.7781 0 7.7781
  [4,16,10.1629,0,4.2097,11.0868,0,4.5924,8.4852,0,8.4852,7.7781,0,7.7781],
// 4 16 7.7781 0 7.7781 8.4852 0 8.4852 4.5924 0 11.0868 4.2097 0 10.1629
  [4,16,7.7781,0,7.7781,8.4852,0,8.4852,4.5924,0,11.0868,4.2097,0,10.1629],
// 4 16 4.2097 0 10.1629 4.5924 0 11.0868 0 0 12 0 0 11
  [4,16,4.2097,0,10.1629,4.5924,0,11.0868,0,0,12,0,0,11],
// 4 16 0 0 11 0 0 12 -4.5924 0 11.0868 -4.2097 0 10.1629
  [4,16,0,0,11,0,0,12,-4.5924,0,11.0868,-4.2097,0,10.1629],
// 4 16 -4.2097 0 10.1629 -4.5924 0 11.0868 -8.4852 0 8.4852 -7.7781 0 7.7781
  [4,16,-4.2097,0,10.1629,-4.5924,0,11.0868,-8.4852,0,8.4852,-7.7781,0,7.7781],
// 4 16 -7.7781 0 7.7781 -8.4852 0 8.4852 -11.0868 0 4.5924 -10.1629 0 4.2097
  [4,16,-7.7781,0,7.7781,-8.4852,0,8.4852,-11.0868,0,4.5924,-10.1629,0,4.2097],
// 4 16 -10.1629 0 4.2097 -11.0868 0 4.5924 -12 0 0 -11 0 0
  [4,16,-10.1629,0,4.2097,-11.0868,0,4.5924,-12,0,0,-11,0,0],
// 4 16 -11 0 0 -12 0 0 -11.0868 0 -4.5924 -10.1629 0 -4.2097
  [4,16,-11,0,0,-12,0,0,-11.0868,0,-4.5924,-10.1629,0,-4.2097],
// 4 16 -10.1629 0 -4.2097 -11.0868 0 -4.5924 -8.4852 0 -8.4852 -7.7781 0 -7.7781
  [4,16,-10.1629,0,-4.2097,-11.0868,0,-4.5924,-8.4852,0,-8.4852,-7.7781,0,-7.7781],
// 4 16 -7.7781 0 -7.7781 -8.4852 0 -8.4852 -4.5924 0 -11.0868 -4.2097 0 -10.1629
  [4,16,-7.7781,0,-7.7781,-8.4852,0,-8.4852,-4.5924,0,-11.0868,-4.2097,0,-10.1629],
// 4 16 -4.2097 0 -10.1629 -4.5924 0 -11.0868 0 0 -12 0 0 -11
  [4,16,-4.2097,0,-10.1629,-4.5924,0,-11.0868,0,0,-12,0,0,-11],
// 4 16 0 0 -11 0 0 -12 4.5924 0 -11.0868 4.2097 0 -10.1629
  [4,16,0,0,-11,0,0,-12,4.5924,0,-11.0868,4.2097,0,-10.1629],
// 4 16 4.2097 0 -10.1629 4.5924 0 -11.0868 8.4852 0 -8.4852 7.7781 0 -7.7781
  [4,16,4.2097,0,-10.1629,4.5924,0,-11.0868,8.4852,0,-8.4852,7.7781,0,-7.7781],
// 4 16 7.7781 0 -7.7781 8.4852 0 -8.4852 11.0868 0 -4.5924 10.1629 0 -4.2097
  [4,16,7.7781,0,-7.7781,8.4852,0,-8.4852,11.0868,0,-4.5924,10.1629,0,-4.2097],
// 4 16 10.1629 0 -4.2097 11.0868 0 -4.5924 12 0 0 11 0 0
  [4,16,10.1629,0,-4.2097,11.0868,0,-4.5924,12,0,0,11,0,0],
// 0
];
makepoly(ldraw_lib__4_4rin11(), line=0.2);
// file: ../p/4-4rin10.scad
use <../lib.scad>
function ldraw_lib__4_4rin10() = [
// 0 Ring 10 x 1.0
// 0 Name: 4-4rin10.dat
// 0 Author: Paul Easter [pneaster]
// 0 !LDRAW_ORG Primitive UPDATE 2010-03
// 0 !LICENSE Licensed under CC BY 2.0 and CC BY 4.0 : see CAreadme.txt
// 
// 0 BFC CERTIFY CCW
  [0,"BFC","CERTIFY"],
  [0,"BFC","CCW"],
// 
// 0 !HISTORY 2004-04-22 [PTadmin] Official Update 2004-02
// 0 !HISTORY 2007-06-24 [PTadmin] Header formatted for Contributor Agreement
// 0 !HISTORY 2008-07-01 [PTadmin] Official Update 2008-01
// 0 !HISTORY 2010-12-19 [MagFors] Corrected with Primitive Generator 2
// 0 !HISTORY 2010-12-31 [PTadmin] Official Update 2010-03
// 
// 
// 4 16 11 0 0 10.1629 0 4.2097 9.239 0 3.827 10 0 0
  [4,16,11,0,0,10.1629,0,4.2097,9.239,0,3.827,10,0,0],
// 4 16 10.1629 0 4.2097 7.7781 0 7.7781 7.071 0 7.071 9.239 0 3.827
  [4,16,10.1629,0,4.2097,7.7781,0,7.7781,7.071,0,7.071,9.239,0,3.827],
// 4 16 7.7781 0 7.7781 4.2097 0 10.1629 3.827 0 9.239 7.071 0 7.071
  [4,16,7.7781,0,7.7781,4.2097,0,10.1629,3.827,0,9.239,7.071,0,7.071],
// 4 16 4.2097 0 10.1629 0 0 11 0 0 10 3.827 0 9.239
  [4,16,4.2097,0,10.1629,0,0,11,0,0,10,3.827,0,9.239],
// 4 16 0 0 11 -4.2097 0 10.1629 -3.827 0 9.239 0 0 10
  [4,16,0,0,11,-4.2097,0,10.1629,-3.827,0,9.239,0,0,10],
// 4 16 -4.2097 0 10.1629 -7.7781 0 7.7781 -7.071 0 7.071 -3.827 0 9.239
  [4,16,-4.2097,0,10.1629,-7.7781,0,7.7781,-7.071,0,7.071,-3.827,0,9.239],
// 4 16 -7.7781 0 7.7781 -10.1629 0 4.2097 -9.239 0 3.827 -7.071 0 7.071
  [4,16,-7.7781,0,7.7781,-10.1629,0,4.2097,-9.239,0,3.827,-7.071,0,7.071],
// 4 16 -10.1629 0 4.2097 -11 0 0 -10 0 0 -9.239 0 3.827
  [4,16,-10.1629,0,4.2097,-11,0,0,-10,0,0,-9.239,0,3.827],
// 4 16 -11 0 0 -10.1629 0 -4.2097 -9.239 0 -3.827 -10 0 0
  [4,16,-11,0,0,-10.1629,0,-4.2097,-9.239,0,-3.827,-10,0,0],
// 4 16 -10.1629 0 -4.2097 -7.7781 0 -7.7781 -7.071 0 -7.071 -9.239 0 -3.827
  [4,16,-10.1629,0,-4.2097,-7.7781,0,-7.7781,-7.071,0,-7.071,-9.239,0,-3.827],
// 4 16 -7.7781 0 -7.7781 -4.2097 0 -10.1629 -3.827 0 -9.239 -7.071 0 -7.071
  [4,16,-7.7781,0,-7.7781,-4.2097,0,-10.1629,-3.827,0,-9.239,-7.071,0,-7.071],
// 4 16 -4.2097 0 -10.1629 0 0 -11 0 0 -10 -3.827 0 -9.239
  [4,16,-4.2097,0,-10.1629,0,0,-11,0,0,-10,-3.827,0,-9.239],
// 4 16 0 0 -11 4.2097 0 -10.1629 3.827 0 -9.239 0 0 -10
  [4,16,0,0,-11,4.2097,0,-10.1629,3.827,0,-9.239,0,0,-10],
// 4 16 4.2097 0 -10.1629 7.7781 0 -7.7781 7.071 0 -7.071 3.827 0 -9.239
  [4,16,4.2097,0,-10.1629,7.7781,0,-7.7781,7.071,0,-7.071,3.827,0,-9.239],
// 4 16 7.7781 0 -7.7781 10.1629 0 -4.2097 9.239 0 -3.827 7.071 0 -7.071
  [4,16,7.7781,0,-7.7781,10.1629,0,-4.2097,9.239,0,-3.827,7.071,0,-7.071],
// 4 16 10.1629 0 -4.2097 11 0 0 10 0 0 9.239 0 -3.827
  [4,16,10.1629,0,-4.2097,11,0,0,10,0,0,9.239,0,-3.827],
// 0 // Build by Primitive Generator 2
// 
];
makepoly(ldraw_lib__4_4rin10(), line=0.2);
// file: ../p/4-4edge.scad
use <../lib.scad>
function ldraw_lib__4_4edge() = [
// 0 Circle 1.0
// 0 Name: 4-4edge.dat
// 0 Author: James Jessiman
// 0 !LDRAW_ORG Primitive UPDATE 2017-01
// 0 !LICENSE Licensed under CC BY 2.0 and CC BY 4.0 : see CAreadme.txt
// 
// 0 BFC CERTIFY CCW
  [0,"BFC","CERTIFY"],
  [0,"BFC","CCW"],
// 
// 0 !HISTORY 1998-12-15 [PTadmin] Official Update 1998-10
// 0 !HISTORY 2005-12-28 [PTadmin] Official Update 2005-01
// 0 !HISTORY 2007-06-24 [PTadmin] Header formatted for Contributor Agreement
// 0 !HISTORY 2008-07-01 [PTadmin] Official Update 2008-01
// 0 !HISTORY 2017-01-15 [Steffen] BFCed
// 0 !HISTORY 2017-12-30 [PTadmin] Official Update 2017-01
// 
// 
// 2 24 1 0 0 0.9239 0 0.3827
  [2,24,1,0,0,0.9239,0,0.3827],
// 2 24 0.9239 0 0.3827 0.7071 0 0.7071
  [2,24,0.9239,0,0.3827,0.7071,0,0.7071],
// 2 24 0.7071 0 0.7071 0.3827 0 0.9239
  [2,24,0.7071,0,0.7071,0.3827,0,0.9239],
// 2 24 0.3827 0 0.9239 0 0 1
  [2,24,0.3827,0,0.9239,0,0,1],
// 2 24 0 0 1 -0.3827 0 0.9239
  [2,24,0,0,1,-0.3827,0,0.9239],
// 2 24 -0.3827 0 0.9239 -0.7071 0 0.7071
  [2,24,-0.3827,0,0.9239,-0.7071,0,0.7071],
// 2 24 -0.7071 0 0.7071 -0.9239 0 0.3827
  [2,24,-0.7071,0,0.7071,-0.9239,0,0.3827],
// 2 24 -0.9239 0 0.3827 -1 0 -0
  [2,24,-0.9239,0,0.3827,-1,0,-0],
// 2 24 -1 0 -0 -0.9239 0 -0.3827
  [2,24,-1,0,-0,-0.9239,0,-0.3827],
// 2 24 -0.9239 0 -0.3827 -0.7071 0 -0.7071
  [2,24,-0.9239,0,-0.3827,-0.7071,0,-0.7071],
// 2 24 -0.7071 0 -0.7071 -0.3827 0 -0.9239
  [2,24,-0.7071,0,-0.7071,-0.3827,0,-0.9239],
// 2 24 -0.3827 0 -0.9239 0 0 -1
  [2,24,-0.3827,0,-0.9239,0,0,-1],
// 2 24 0 0 -1 0.3827 0 -0.9239
  [2,24,0,0,-1,0.3827,0,-0.9239],
// 2 24 0.3827 0 -0.9239 0.7071 0 -0.7071
  [2,24,0.3827,0,-0.9239,0.7071,0,-0.7071],
// 2 24 0.7071 0 -0.7071 0.9239 0 -0.3827
  [2,24,0.7071,0,-0.7071,0.9239,0,-0.3827],
// 2 24 0.9239 0 -0.3827 1 0 0
  [2,24,0.9239,0,-0.3827,1,0,0],
];
makepoly(ldraw_lib__4_4edge(), line=0.2);
// file: ../p/4-4cyli.scad
use <../lib.scad>
function ldraw_lib__4_4cyli() = [
// 0 Cylinder 1.0
// 0 Name: 4-4cyli.dat
// 0 Author: James Jessiman
// 0 !LDRAW_ORG Primitive UPDATE 2005-01
// 0 !LICENSE Licensed under CC BY 2.0 and CC BY 4.0 : see CAreadme.txt
// 
// 0 BFC CERTIFY CCW
  [0,"BFC","CERTIFY"],
  [0,"BFC","CCW"],
// 
// 0 !HISTORY 1998-12-15 [PTadmin] Official Update 1998-10
// 0 !HISTORY 2002-03-23 [sbliss] Added BFC statement; merged headers from files in distributions LDraw 0.27 and Complete.
// 0 !HISTORY 2002-04-25 [PTadmin] Official Update 2002-02
// 0 !HISTORY 2004-12-14 [guyvivan] BFC CCW
// 0 !HISTORY 2005-12-28 [PTadmin] Official Update 2005-01
// 0 !HISTORY 2007-06-24 [PTadmin] Header formatted for Contributor Agreement
// 0 !HISTORY 2008-07-01 [PTadmin] Official Update 2008-01
// 
// 
// 4 16 1 1 0 0.9239 1 0.3827 0.9239 0 0.3827 1 0 0
  [4,16,1,1,0,0.9239,1,0.3827,0.9239,0,0.3827,1,0,0],
// 5 24 1 0 0 1 1 0 0.9239 0 0.3827 0.9239 0 -0.3827
  [5,24,1,0,0,1,1,0,0.9239,0,0.3827,0.9239,0,-0.3827],
// 4 16 0.9239 1 0.3827 0.7071 1 0.7071 0.7071 0 0.7071 0.9239 0 0.3827
  [4,16,0.9239,1,0.3827,0.7071,1,0.7071,0.7071,0,0.7071,0.9239,0,0.3827],
// 5 24 0.9239 0 0.3827 0.9239 1 0.3827 0.7071 0 0.7071 1 0 0
  [5,24,0.9239,0,0.3827,0.9239,1,0.3827,0.7071,0,0.7071,1,0,0],
// 4 16 0.7071 1 0.7071 0.3827 1 0.9239 0.3827 0 0.9239 0.7071 0 0.7071
  [4,16,0.7071,1,0.7071,0.3827,1,0.9239,0.3827,0,0.9239,0.7071,0,0.7071],
// 5 24 0.7071 0 0.7071 0.7071 1 0.7071 0.3827 0 0.9239 0.9239 0 0.3827
  [5,24,0.7071,0,0.7071,0.7071,1,0.7071,0.3827,0,0.9239,0.9239,0,0.3827],
// 4 16 0.3827 1 0.9239 0 1 1 0 0 1 0.3827 0 0.9239
  [4,16,0.3827,1,0.9239,0,1,1,0,0,1,0.3827,0,0.9239],
// 5 24 0.3827 0 0.9239 0.3827 1 0.9239 0 0 1 0.7071 0 0.7071
  [5,24,0.3827,0,0.9239,0.3827,1,0.9239,0,0,1,0.7071,0,0.7071],
// 4 16 0 1 1 -0.3827 1 0.9239 -0.3827 0 0.9239 0 0 1
  [4,16,0,1,1,-0.3827,1,0.9239,-0.3827,0,0.9239,0,0,1],
// 5 24 0 0 1 0 1 1 -0.3827 0 0.9239 0.3827 0 0.9239
  [5,24,0,0,1,0,1,1,-0.3827,0,0.9239,0.3827,0,0.9239],
// 4 16 -0.3827 1 0.9239 -0.7071 1 0.7071 -0.7071 0 0.7071 -0.3827 0 0.9239
  [4,16,-0.3827,1,0.9239,-0.7071,1,0.7071,-0.7071,0,0.7071,-0.3827,0,0.9239],
// 5 24 -0.3827 0 0.9239 -0.3827 1 0.9239 -0.7071 0 0.7071 0 0 1
  [5,24,-0.3827,0,0.9239,-0.3827,1,0.9239,-0.7071,0,0.7071,0,0,1],
// 4 16 -0.7071 1 0.7071 -0.9239 1 0.3827 -0.9239 0 0.3827 -0.7071 0 0.7071
  [4,16,-0.7071,1,0.7071,-0.9239,1,0.3827,-0.9239,0,0.3827,-0.7071,0,0.7071],
// 5 24 -0.7071 0 0.7071 -0.7071 1 0.7071 -0.9239 0 0.3827 -0.3827 0 0.9239
  [5,24,-0.7071,0,0.7071,-0.7071,1,0.7071,-0.9239,0,0.3827,-0.3827,0,0.9239],
// 4 16 -0.9239 1 0.3827 -1 1 0 -1 0 0 -0.9239 0 0.3827
  [4,16,-0.9239,1,0.3827,-1,1,0,-1,0,0,-0.9239,0,0.3827],
// 5 24 -0.9239 0 0.3827 -0.9239 1 0.3827 -1 0 0 -0.7071 0 0.7071
  [5,24,-0.9239,0,0.3827,-0.9239,1,0.3827,-1,0,0,-0.7071,0,0.7071],
// 4 16 -1 1 0 -0.9239 1 -0.3827 -0.9239 0 -0.3827 -1 0 0
  [4,16,-1,1,0,-0.9239,1,-0.3827,-0.9239,0,-0.3827,-1,0,0],
// 5 24 -1 0 0 -1 1 0 -0.9239 0 -0.3827 -0.9239 0 0.3827
  [5,24,-1,0,0,-1,1,0,-0.9239,0,-0.3827,-0.9239,0,0.3827],
// 4 16 -0.9239 1 -0.3827 -0.7071 1 -0.7071 -0.7071 0 -0.7071 -0.9239 0 -0.3827
  [4,16,-0.9239,1,-0.3827,-0.7071,1,-0.7071,-0.7071,0,-0.7071,-0.9239,0,-0.3827],
// 5 24 -0.9239 0 -0.3827 -0.9239 1 -0.3827 -0.7071 0 -0.7071 -1 0 0
  [5,24,-0.9239,0,-0.3827,-0.9239,1,-0.3827,-0.7071,0,-0.7071,-1,0,0],
// 4 16 -0.7071 1 -0.7071 -0.3827 1 -0.9239 -0.3827 0 -0.9239 -0.7071 0 -0.7071
  [4,16,-0.7071,1,-0.7071,-0.3827,1,-0.9239,-0.3827,0,-0.9239,-0.7071,0,-0.7071],
// 5 24 -0.7071 0 -0.7071 -0.7071 1 -0.7071 -0.3827 0 -0.9239 -0.9239 0 -0.3827
  [5,24,-0.7071,0,-0.7071,-0.7071,1,-0.7071,-0.3827,0,-0.9239,-0.9239,0,-0.3827],
// 4 16 -0.3827 1 -0.9239 0 1 -1 0 0 -1 -0.3827 0 -0.9239
  [4,16,-0.3827,1,-0.9239,0,1,-1,0,0,-1,-0.3827,0,-0.9239],
// 5 24 -0.3827 0 -0.9239 -0.3827 1 -0.9239 0 0 -1 -0.7071 0 -0.7071
  [5,24,-0.3827,0,-0.9239,-0.3827,1,-0.9239,0,0,-1,-0.7071,0,-0.7071],
// 4 16 0 1 -1 0.3827 1 -0.9239 0.3827 0 -0.9239 0 0 -1
  [4,16,0,1,-1,0.3827,1,-0.9239,0.3827,0,-0.9239,0,0,-1],
// 5 24 0 0 -1 0 1 -1 0.3827 0 -0.9239 -0.3827 0 -0.9239
  [5,24,0,0,-1,0,1,-1,0.3827,0,-0.9239,-0.3827,0,-0.9239],
// 4 16 0.3827 1 -0.9239 0.7071 1 -0.7071 0.7071 0 -0.7071 0.3827 0 -0.9239
  [4,16,0.3827,1,-0.9239,0.7071,1,-0.7071,0.7071,0,-0.7071,0.3827,0,-0.9239],
// 5 24 0.3827 0 -0.9239 0.3827 1 -0.9239 0.7071 0 -0.7071 0 0 -1
  [5,24,0.3827,0,-0.9239,0.3827,1,-0.9239,0.7071,0,-0.7071,0,0,-1],
// 4 16 0.7071 1 -0.7071 0.9239 1 -0.3827 0.9239 0 -0.3827 0.7071 0 -0.7071
  [4,16,0.7071,1,-0.7071,0.9239,1,-0.3827,0.9239,0,-0.3827,0.7071,0,-0.7071],
// 5 24 0.7071 0 -0.7071 0.7071 1 -0.7071 0.9239 0 -0.3827 0.3827 0 -0.9239
  [5,24,0.7071,0,-0.7071,0.7071,1,-0.7071,0.9239,0,-0.3827,0.3827,0,-0.9239],
// 4 16 0.9239 1 -0.3827 1 1 0 1 0 0 0.9239 0 -0.3827
  [4,16,0.9239,1,-0.3827,1,1,0,1,0,0,0.9239,0,-0.3827],
// 5 24 0.9239 0 -0.3827 0.9239 1 -0.3827 1 0 0 0.7071 0 -0.7071
  [5,24,0.9239,0,-0.3827,0.9239,1,-0.3827,1,0,0,0.7071,0,-0.7071],
// 0
];
makepoly(ldraw_lib__4_4cyli(), line=0.2);
// main file
use <../lib.scad>
use <../p/4-4cyli.scad>
use <../p/4-4edge.scad>
use <../p/4-4rin10.scad>
use <../p/4-4rin11.scad>
use <../p/4-8sphe.scad>
use <s/90617s02.scad>
use <../p/stud4od.scad>
function ldraw_lib__20401() = [
// 0 Decoration Ball 11.3
// 0 Name: 20401.dat
// 0 Author: Magnus Forsberg [MagFors]
// 0 !LDRAW_ORG Part UPDATE 2018-02
// 0 !LICENSE Licensed under CC BY 2.0 and CC BY 4.0 : see CAreadme.txt
// 
// 0 BFC CERTIFY CCW
  [0,"BFC","CERTIFY"],
  [0,"BFC","CCW"],
// 
// 0 !CATEGORY Sphere
// 
// 0 !HISTORY 2018-12-08 [PTadmin] Official Update 2018-02
// 
// 
// 1 16 0 -4 0 1 0 0 0 -1 0 0 0 1 stud4od.dat
  [1,16,0,-4,0,1,0,0,0,-1,0,0,0,1, ldraw_lib__stud4od()],
// 1 16 0 -4 0 0.5 0 0 0 -1 0 0 0 -0.5 4-4rin11.dat
  [1,16,0,-4,0,0.5,0,0,0,-1,0,0,0,-0.5, ldraw_lib__4_4rin11()],
// 1 16 0 -4 0 5.5 0 0 0 1 0 0 0 5.5 4-4edge.dat
  [1,16,0,-4,0,5.5,0,0,0,1,0,0,0,5.5, ldraw_lib__4_4edge()],
// 0 BFC INVERTNEXT
  [0,"BFC","INVERTNEXT"],
// 1 16 0 -11 0 5.5 0 0 0 7 0 0 0 5.5 4-4cyli.dat
  [1,16,0,-11,0,5.5,0,0,0,7,0,0,0,5.5, ldraw_lib__4_4cyli()],
// 0 BFC INVERTNEXT
  [0,"BFC","INVERTNEXT"],
// 1 16 0 -11 0 5.5 0 0 0 -5.5 0 0 0 -5.5 4-8sphe.dat
  [1,16,0,-11,0,5.5,0,0,0,-5.5,0,0,0,-5.5, ldraw_lib__4_8sphe()],
// 1 16 0 0 0 8.8 0 0 0 1 0 0 0 8.8 4-4edge.dat
  [1,16,0,0,0,8.8,0,0,0,1,0,0,0,8.8, ldraw_lib__4_4edge()],
// 1 16 0 0 0 0.8 0 0 0 -1 0 0 0 -0.8 4-4rin10.dat
  [1,16,0,0,0,0.8,0,0,0,-1,0,0,0,-0.8, ldraw_lib__4_4rin10()],
// 1 16 0 -11 0 0 1.1 0 0 0 1.1 1.1 0 0 s\90617s02.dat
  [1,16,0,-11,0,0,1.1,0,0,0,1.1,1.1,0,0, ldraw_lib__s__90617s02()],
// 1 16 0 -11 0 -1.1 0 0 0 0 1.1 0 1.1 0 s\90617s02.dat
  [1,16,0,-11,0,-1.1,0,0,0,0,1.1,0,1.1,0, ldraw_lib__s__90617s02()],
// 1 16 0 -11 0 0 -1.1 0 0 0 1.1 -1.1 0 0 s\90617s02.dat
  [1,16,0,-11,0,0,-1.1,0,0,0,1.1,-1.1,0,0, ldraw_lib__s__90617s02()],
// 1 16 0 -11 0 1.1 0 0 0 0 1.1 0 -1.1 0 s\90617s02.dat
  [1,16,0,-11,0,1.1,0,0,0,0,1.1,0,-1.1,0, ldraw_lib__s__90617s02()],
// 1 16 0 -11 0 14.091 0 0 0 -14.091 0 0 0 -14.091 4-8sphe.dat
  [1,16,0,-11,0,14.091,0,0,0,-14.091,0,0,0,-14.091, ldraw_lib__4_8sphe()],
];
makepoly(ldraw_lib__20401(), line=0.2);
